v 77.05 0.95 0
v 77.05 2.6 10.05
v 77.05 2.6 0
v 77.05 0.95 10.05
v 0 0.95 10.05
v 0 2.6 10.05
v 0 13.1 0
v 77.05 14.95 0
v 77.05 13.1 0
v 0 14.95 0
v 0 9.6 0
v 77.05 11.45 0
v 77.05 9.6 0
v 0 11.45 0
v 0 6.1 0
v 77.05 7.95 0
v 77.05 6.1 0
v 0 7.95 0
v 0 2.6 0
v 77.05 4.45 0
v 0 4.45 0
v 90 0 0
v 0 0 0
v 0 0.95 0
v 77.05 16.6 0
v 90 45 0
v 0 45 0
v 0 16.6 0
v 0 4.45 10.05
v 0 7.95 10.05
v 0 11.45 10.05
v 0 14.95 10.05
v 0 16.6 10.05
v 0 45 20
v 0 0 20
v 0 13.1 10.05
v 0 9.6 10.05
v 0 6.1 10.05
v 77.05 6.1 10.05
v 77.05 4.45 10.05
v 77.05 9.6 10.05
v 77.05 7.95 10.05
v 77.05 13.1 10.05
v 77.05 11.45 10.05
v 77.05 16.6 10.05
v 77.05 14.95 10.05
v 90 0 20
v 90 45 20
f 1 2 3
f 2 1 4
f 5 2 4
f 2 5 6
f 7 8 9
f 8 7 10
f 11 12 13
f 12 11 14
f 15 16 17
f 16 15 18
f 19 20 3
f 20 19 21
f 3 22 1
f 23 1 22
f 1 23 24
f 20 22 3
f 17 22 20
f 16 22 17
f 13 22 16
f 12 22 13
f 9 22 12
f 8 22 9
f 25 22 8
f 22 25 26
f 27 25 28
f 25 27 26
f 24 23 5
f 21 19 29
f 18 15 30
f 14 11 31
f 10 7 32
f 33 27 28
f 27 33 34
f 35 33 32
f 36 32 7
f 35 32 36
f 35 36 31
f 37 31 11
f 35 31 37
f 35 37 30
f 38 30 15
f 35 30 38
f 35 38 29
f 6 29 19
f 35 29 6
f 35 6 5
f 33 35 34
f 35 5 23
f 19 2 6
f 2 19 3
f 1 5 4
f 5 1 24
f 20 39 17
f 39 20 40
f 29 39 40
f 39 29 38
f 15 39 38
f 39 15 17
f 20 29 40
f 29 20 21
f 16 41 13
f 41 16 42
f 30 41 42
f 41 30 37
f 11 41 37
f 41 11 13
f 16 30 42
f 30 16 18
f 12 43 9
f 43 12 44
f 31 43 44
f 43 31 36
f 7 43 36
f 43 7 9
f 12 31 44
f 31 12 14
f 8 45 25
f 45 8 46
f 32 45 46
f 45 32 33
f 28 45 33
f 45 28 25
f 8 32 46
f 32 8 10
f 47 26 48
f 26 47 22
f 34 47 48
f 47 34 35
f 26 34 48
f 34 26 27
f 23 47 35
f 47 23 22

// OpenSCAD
// Drying rack for 10 microscope slides.
// Base: 90 x 45 x 20 mm.
// Slots: 10 parallel slots along X, 77 mm long, 1.6 mm wide, 10 mm deep.
// Spacing: 3.5 mm centre-to-centre in Y, centred on the block.

// Base dimensions
L_base = 90;
W_base = 45;
H_base = 20;

// Slide dimensions (for reference)
slide_w = 25;
slide_h = 75;
slide_t = 1;

// Slot dimensions
slot_len = 77;
slot_w   = 1.6;
slot_d   = 10;

// Spacing
slot_spacing = 3.5;

// Tolerance for cutting (extends slightly past faces to ensure clean removal)
tol = 0.05;

$fn = 64;

// Calculate the Y position of the first slot centre.
// We have 10 slots. The group is centred on the block in Y.
// The distance from the block centre to the first slot centre is:
// (W_base / 2) - ( (n-1)/2 * spacing + slot_w/2 )
// Or simply: start_pos = - ( (n-1)*spacing/2 + slot_w/2 )
n_slots = 10;
y_start = - ( (n_slots - 1) * slot_spacing / 2 + slot_w / 2 );

difference() {
    // 1. Create the solid base block
    translate([0, 0, 0]) 
        cube([L_base, W_base, H_base]);

    // 2. Cut the 10 slots
    // Slots run along X, so we cut a long thin rectangle going into the block.
    // The slot is open at the top (Z=0) and goes down to Z = H_base - slot_d.
    // We extend the cut slightly past the bottom to ensure clean removal.
    for (i = [0 : n_slots - 1]) {
        // Calculate Y position for this slot
        y_pos = y_start + i * slot_spacing;
        
        // Define the cutting shape
        // It is a prism: length = slot_len + tolerance, width = slot_w + tolerance, height = slot_d + tolerance
        translate([0, y_pos, 0]) 
            cube([slot_len + tol, slot_w + tol, slot_d + tol]);
    }
}
